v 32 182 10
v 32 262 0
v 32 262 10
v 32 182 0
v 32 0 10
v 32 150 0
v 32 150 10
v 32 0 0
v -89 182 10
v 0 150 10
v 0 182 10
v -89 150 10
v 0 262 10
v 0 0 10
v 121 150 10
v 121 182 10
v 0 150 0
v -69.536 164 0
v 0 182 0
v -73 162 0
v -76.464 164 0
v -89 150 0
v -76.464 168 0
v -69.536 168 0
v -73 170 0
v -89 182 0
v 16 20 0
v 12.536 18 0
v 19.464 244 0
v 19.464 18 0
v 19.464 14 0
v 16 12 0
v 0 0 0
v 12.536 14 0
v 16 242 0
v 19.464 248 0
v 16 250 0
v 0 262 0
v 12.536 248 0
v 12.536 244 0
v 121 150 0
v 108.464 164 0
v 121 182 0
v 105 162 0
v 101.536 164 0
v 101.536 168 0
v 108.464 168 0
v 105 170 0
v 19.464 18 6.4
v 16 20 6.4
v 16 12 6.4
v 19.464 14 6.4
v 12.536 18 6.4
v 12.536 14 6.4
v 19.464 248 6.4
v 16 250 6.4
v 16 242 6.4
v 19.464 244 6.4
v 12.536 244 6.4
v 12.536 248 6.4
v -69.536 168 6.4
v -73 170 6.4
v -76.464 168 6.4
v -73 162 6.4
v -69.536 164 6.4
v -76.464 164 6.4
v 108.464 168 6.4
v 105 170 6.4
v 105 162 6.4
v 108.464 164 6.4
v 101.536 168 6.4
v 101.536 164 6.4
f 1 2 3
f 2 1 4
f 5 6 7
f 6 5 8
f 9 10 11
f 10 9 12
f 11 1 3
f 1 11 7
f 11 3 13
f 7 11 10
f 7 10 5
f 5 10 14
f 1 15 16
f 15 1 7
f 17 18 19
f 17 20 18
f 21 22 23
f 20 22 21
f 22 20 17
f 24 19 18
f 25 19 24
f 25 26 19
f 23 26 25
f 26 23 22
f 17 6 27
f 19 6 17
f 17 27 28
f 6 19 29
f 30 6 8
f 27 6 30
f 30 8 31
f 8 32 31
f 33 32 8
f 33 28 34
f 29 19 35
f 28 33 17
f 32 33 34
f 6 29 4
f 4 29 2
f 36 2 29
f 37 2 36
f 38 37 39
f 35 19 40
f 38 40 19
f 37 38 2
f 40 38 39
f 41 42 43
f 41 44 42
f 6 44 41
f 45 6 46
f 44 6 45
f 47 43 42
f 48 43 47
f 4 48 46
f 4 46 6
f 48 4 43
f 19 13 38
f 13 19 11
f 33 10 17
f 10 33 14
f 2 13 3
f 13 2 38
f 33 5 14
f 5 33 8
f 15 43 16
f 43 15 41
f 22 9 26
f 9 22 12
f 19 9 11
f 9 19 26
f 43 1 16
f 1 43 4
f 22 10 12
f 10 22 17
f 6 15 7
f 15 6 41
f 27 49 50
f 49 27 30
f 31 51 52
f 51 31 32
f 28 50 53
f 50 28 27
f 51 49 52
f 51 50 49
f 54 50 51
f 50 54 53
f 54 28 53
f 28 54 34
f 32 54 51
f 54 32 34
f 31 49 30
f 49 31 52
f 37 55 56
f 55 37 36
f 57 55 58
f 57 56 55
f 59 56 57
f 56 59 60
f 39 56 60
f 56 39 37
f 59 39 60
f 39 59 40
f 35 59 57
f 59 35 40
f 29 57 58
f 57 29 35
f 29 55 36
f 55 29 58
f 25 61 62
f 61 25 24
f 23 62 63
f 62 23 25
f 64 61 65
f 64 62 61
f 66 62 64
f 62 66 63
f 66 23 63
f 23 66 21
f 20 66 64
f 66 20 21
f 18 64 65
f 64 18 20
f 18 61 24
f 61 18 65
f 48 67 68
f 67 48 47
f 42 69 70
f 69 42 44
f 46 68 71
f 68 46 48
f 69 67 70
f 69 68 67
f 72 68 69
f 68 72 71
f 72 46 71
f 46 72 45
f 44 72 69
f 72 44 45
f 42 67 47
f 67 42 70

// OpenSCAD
wall           =  1;
cross_width    = 210;
cross_height   = 262;
cross_crossing =  80;
cross_thick    =  32;

magnet_height1 =   4.5;
magnet_height2 =  12.5;
magnet_diam    =  10;
screw_diam     =   4;
nut_height     =   3.2;
nut_diam       =   8;
$fn            =  40;

screw_height = magnet_height2-magnet_height1;
nut_radius   = 0.5 * nut_diam;

module hexagon(radius) {
    polygon(
        points = [
            [radius * sin(0*60), radius * cos(0*60)],
            [radius * sin(1*60), radius * cos(1*60)],
            [radius * sin(2*60), radius * cos(2*60)],
            [radius * sin(3*60), radius * cos(3*60)],
            [radius * sin(4*60), radius * cos(4*60)],
            [radius * sin(5*60), radius * cos(5*60)]
        ]
    );
}

module nut(radius, height) {
    linear_extrude(height) {
        hexagon(radius);
    };
}

module screw() {
    cylinder( d = screw_diam, h = screw_height );
}

module magnet() {
    cylinder( d = magnet_diam, h = magnet_height1+2 );
    translate([0, 0, magnet_height1]) screw();
}

module magnet_complet() {
    translate([0, 0, -1])
        magnet();
    translate([0, 0, magnet_height2-nut_height])
        nut(nut_radius, nut_height+1);
    translate([0, 0, magnet_height2])
        nut(nut_radius, nut_height+1);
}

module crossX_magnet() {
    difference() {
        union() {
            cube([cross_thick, cross_height, magnet_height1+wall+1]);
            translate([-0.5*(cross_width-cross_thick), cross_height-cross_crossing-cross_thick, 0])
            cube([cross_width, cross_thick, magnet_height1+wall+1]);
        }

        translate([0.5*cross_thick, 0.5*cross_thick, 0])
            magnet_complet();
        translate([0.5*cross_thick, cross_height - 0.5*cross_thick, 0])
            magnet_complet();
        translate([-0.5*(cross_width-cross_thick)+0.5*cross_thick, cross_height - cross_crossing - 0.5*cross_thick, 0])
            magnet_complet();
        translate([0.5*cross_width, cross_height - cross_crossing - 0.5*cross_thick, 0])
            magnet_complet();
    }
}

module crossX_cover() {
    difference() {
        union() {
            cube([cross_thick, cross_height, screw_height+wall+1]);
            translate([-0.5*(cross_width-cross_thick), cross_height-cross_crossing-cross_thick, 0])
            cube([cross_width, cross_thick, screw_height+wall+1]);
        }
        
        translate([0.5*cross_thick, 0.5*cross_thick, -1])
            nut(nut_radius, 2*nut_height+1);
        
        translate([0.5*cross_thick, cross_height - 0.5*cross_thick, -1])
            nut(nut_radius, 2*nut_height+1);
        
        translate([-0.5*(cross_width-cross_thick)+0.5*cross_thick, cross_height - cross_crossing - 0.5*cross_thick, -1])
            nut(nut_radius, 2*nut_height+1);
        
        translate([0.5*cross_width, cross_height - cross_crossing - 0.5*cross_thick, -1])
            nut(nut_radius, 2*nut_height+1);
    }
}

//crossX_magnet();
crossX_cover();
